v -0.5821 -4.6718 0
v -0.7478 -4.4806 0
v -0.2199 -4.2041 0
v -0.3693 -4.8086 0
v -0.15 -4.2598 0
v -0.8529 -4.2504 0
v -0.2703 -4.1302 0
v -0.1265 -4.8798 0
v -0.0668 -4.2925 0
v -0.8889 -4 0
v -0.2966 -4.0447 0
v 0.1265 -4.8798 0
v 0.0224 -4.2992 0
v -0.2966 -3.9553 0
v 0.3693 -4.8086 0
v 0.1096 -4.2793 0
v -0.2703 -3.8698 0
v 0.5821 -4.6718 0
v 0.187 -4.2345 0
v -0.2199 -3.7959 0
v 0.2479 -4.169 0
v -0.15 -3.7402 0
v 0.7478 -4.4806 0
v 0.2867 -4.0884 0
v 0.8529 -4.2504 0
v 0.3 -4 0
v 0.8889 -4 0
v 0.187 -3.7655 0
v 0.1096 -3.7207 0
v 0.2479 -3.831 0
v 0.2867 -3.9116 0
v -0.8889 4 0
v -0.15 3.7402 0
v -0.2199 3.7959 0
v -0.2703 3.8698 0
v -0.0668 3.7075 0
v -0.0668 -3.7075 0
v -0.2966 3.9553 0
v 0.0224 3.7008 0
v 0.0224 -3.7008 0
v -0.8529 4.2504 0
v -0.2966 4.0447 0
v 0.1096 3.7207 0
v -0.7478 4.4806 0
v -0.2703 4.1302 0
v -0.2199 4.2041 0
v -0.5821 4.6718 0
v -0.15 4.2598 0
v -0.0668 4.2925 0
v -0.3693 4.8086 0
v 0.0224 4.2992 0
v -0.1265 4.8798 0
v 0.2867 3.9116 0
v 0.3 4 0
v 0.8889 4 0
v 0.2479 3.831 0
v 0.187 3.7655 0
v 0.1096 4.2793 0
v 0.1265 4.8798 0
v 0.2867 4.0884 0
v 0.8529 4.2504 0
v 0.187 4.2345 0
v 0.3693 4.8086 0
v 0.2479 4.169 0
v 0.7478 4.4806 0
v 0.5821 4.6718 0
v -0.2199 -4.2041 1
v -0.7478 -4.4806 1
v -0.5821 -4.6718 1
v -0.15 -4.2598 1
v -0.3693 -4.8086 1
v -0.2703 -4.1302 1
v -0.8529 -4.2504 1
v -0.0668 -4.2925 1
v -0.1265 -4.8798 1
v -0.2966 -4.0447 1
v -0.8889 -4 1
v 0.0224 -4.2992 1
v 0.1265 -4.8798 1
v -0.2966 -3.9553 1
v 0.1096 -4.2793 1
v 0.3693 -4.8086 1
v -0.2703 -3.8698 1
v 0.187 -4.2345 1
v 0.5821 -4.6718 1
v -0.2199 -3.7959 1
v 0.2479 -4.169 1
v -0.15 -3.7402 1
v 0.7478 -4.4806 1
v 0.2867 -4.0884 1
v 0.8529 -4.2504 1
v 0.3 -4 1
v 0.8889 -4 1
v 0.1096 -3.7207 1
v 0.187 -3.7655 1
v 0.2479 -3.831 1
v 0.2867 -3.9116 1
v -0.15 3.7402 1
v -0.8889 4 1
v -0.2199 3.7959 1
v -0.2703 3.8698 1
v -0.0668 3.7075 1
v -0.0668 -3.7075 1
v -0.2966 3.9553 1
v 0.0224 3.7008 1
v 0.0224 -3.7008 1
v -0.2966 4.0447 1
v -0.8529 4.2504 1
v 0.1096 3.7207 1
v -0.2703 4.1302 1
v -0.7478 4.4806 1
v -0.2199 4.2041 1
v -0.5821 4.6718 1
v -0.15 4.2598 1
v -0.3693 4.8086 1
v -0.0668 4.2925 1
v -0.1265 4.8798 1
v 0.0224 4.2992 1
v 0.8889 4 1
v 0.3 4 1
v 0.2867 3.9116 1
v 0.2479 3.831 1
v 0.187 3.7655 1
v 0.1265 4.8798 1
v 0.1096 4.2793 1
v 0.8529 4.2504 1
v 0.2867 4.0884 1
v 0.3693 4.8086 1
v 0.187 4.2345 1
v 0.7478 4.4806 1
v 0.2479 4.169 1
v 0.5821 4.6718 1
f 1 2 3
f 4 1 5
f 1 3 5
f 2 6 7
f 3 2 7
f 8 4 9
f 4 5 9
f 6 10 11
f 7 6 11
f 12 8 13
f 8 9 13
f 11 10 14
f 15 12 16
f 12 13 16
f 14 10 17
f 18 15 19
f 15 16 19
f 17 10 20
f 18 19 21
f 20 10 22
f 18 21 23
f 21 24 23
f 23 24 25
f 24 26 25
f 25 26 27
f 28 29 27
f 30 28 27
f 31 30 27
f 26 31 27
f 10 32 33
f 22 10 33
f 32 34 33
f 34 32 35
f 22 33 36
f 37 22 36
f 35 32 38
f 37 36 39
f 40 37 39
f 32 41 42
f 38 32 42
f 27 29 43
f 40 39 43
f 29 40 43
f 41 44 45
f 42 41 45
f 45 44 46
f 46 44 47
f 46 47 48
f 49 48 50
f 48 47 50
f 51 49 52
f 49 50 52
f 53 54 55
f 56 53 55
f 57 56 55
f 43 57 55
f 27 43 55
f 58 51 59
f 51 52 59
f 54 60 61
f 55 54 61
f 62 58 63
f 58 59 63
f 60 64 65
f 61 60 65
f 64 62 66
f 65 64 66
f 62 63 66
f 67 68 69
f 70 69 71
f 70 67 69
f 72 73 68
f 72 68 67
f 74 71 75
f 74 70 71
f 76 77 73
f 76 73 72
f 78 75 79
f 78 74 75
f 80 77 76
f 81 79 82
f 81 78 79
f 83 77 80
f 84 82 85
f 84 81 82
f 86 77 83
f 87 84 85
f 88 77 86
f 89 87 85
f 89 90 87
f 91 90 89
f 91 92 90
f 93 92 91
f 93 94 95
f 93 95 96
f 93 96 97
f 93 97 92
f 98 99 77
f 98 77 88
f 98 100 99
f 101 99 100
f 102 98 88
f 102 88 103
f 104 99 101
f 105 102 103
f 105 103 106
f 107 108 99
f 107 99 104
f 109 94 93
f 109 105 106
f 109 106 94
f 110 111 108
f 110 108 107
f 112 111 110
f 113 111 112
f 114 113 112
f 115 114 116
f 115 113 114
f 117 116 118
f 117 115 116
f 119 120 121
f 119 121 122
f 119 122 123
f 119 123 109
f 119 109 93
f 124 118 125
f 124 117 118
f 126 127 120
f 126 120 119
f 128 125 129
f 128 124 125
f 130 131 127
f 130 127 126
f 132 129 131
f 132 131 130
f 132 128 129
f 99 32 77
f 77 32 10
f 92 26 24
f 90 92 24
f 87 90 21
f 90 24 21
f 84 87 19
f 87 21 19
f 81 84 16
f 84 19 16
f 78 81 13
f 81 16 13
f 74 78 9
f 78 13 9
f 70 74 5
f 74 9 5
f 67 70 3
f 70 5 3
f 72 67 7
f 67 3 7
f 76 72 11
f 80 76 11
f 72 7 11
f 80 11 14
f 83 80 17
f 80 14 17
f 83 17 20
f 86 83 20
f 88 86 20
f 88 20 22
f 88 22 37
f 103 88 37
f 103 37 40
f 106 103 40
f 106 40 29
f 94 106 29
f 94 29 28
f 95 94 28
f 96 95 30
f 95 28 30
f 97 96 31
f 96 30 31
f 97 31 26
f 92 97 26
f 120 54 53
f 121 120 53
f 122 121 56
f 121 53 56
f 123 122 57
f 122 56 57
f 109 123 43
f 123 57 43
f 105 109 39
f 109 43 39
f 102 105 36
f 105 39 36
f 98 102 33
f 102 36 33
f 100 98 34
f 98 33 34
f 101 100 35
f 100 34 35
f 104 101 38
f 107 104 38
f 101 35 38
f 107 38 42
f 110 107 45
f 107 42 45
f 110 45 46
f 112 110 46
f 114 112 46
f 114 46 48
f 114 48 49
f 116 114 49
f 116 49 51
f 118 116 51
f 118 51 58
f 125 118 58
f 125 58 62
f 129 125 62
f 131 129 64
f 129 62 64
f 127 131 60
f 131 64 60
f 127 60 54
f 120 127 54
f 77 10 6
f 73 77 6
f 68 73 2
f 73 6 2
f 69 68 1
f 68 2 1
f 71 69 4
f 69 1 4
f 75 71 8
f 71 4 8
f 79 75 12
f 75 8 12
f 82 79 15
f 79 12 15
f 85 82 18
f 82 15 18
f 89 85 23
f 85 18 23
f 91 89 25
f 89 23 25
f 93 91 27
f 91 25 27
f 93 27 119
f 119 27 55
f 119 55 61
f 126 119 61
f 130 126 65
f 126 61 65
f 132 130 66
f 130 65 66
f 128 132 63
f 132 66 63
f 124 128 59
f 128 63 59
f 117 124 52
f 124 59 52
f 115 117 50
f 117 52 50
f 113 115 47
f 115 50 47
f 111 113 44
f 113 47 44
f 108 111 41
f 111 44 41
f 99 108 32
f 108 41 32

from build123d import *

# Parameters (mm, degrees)
EXTRUDE_3_DEPTH = 1


with BuildPart() as part:
    # 草图1 → 凸台-拉伸3 (new body)
    with BuildSketch(Plane.XY):
        with BuildLine():
            ThreePointArc((-0.3, 4), (0, 4.3), (0.3, 4))
            Line((0.3, 4), (0.888888889, 4))
            ThreePointArc((0.888888889, 4), (0, 4.888888889), (-0.888888889, 4))
            Line((-0.888888889, 4), (-0.3, 4))
        make_face()
        with BuildLine():
            Line((0.888888889, 4), (0.3, 4))
            ThreePointArc((0.3, 4), (0, 3.7), (-0.3, 4))
            Line((-0.3, 4), (-0.888888889, 4))
            ThreePointArc((-0.888888889, 4), (0, 3.111111111), (0.888888889, 4))
        make_face()
        with BuildLine():
            Line((0.888888889, -4), (0.888888889, 4))
            ThreePointArc((0.888888889, 4), (0, 3.111111111), (-0.888888889, 4))
            Line((-0.888888889, 4), (-0.888888889, -4))
            ThreePointArc((-0.888888889, -4), (0, -3.111111111), (0.888888889, -4))
        make_face()
        with BuildLine():
            ThreePointArc((-0.888888889, -4), (0, -4.888888889), (0.888888889, -4))
            Line((0.888888889, -4), (0.3, -4))
            ThreePointArc((0.3, -4), (0, -4.3), (-0.3, -4))
            Line((-0.3, -4), (-0.888888889, -4))
        make_face()
        with BuildLine():
            Line((0.3, -4), (0.888888889, -4))
            ThreePointArc((0.888888889, -4), (0, -3.111111111), (-0.888888889, -4))
            Line((-0.888888889, -4), (-0.3, -4))
            ThreePointArc((-0.3, -4), (0, -3.7), (0.3, -4))
        make_face()
    extrude(amount=EXTRUDE_3_DEPTH)


solid = part.part
